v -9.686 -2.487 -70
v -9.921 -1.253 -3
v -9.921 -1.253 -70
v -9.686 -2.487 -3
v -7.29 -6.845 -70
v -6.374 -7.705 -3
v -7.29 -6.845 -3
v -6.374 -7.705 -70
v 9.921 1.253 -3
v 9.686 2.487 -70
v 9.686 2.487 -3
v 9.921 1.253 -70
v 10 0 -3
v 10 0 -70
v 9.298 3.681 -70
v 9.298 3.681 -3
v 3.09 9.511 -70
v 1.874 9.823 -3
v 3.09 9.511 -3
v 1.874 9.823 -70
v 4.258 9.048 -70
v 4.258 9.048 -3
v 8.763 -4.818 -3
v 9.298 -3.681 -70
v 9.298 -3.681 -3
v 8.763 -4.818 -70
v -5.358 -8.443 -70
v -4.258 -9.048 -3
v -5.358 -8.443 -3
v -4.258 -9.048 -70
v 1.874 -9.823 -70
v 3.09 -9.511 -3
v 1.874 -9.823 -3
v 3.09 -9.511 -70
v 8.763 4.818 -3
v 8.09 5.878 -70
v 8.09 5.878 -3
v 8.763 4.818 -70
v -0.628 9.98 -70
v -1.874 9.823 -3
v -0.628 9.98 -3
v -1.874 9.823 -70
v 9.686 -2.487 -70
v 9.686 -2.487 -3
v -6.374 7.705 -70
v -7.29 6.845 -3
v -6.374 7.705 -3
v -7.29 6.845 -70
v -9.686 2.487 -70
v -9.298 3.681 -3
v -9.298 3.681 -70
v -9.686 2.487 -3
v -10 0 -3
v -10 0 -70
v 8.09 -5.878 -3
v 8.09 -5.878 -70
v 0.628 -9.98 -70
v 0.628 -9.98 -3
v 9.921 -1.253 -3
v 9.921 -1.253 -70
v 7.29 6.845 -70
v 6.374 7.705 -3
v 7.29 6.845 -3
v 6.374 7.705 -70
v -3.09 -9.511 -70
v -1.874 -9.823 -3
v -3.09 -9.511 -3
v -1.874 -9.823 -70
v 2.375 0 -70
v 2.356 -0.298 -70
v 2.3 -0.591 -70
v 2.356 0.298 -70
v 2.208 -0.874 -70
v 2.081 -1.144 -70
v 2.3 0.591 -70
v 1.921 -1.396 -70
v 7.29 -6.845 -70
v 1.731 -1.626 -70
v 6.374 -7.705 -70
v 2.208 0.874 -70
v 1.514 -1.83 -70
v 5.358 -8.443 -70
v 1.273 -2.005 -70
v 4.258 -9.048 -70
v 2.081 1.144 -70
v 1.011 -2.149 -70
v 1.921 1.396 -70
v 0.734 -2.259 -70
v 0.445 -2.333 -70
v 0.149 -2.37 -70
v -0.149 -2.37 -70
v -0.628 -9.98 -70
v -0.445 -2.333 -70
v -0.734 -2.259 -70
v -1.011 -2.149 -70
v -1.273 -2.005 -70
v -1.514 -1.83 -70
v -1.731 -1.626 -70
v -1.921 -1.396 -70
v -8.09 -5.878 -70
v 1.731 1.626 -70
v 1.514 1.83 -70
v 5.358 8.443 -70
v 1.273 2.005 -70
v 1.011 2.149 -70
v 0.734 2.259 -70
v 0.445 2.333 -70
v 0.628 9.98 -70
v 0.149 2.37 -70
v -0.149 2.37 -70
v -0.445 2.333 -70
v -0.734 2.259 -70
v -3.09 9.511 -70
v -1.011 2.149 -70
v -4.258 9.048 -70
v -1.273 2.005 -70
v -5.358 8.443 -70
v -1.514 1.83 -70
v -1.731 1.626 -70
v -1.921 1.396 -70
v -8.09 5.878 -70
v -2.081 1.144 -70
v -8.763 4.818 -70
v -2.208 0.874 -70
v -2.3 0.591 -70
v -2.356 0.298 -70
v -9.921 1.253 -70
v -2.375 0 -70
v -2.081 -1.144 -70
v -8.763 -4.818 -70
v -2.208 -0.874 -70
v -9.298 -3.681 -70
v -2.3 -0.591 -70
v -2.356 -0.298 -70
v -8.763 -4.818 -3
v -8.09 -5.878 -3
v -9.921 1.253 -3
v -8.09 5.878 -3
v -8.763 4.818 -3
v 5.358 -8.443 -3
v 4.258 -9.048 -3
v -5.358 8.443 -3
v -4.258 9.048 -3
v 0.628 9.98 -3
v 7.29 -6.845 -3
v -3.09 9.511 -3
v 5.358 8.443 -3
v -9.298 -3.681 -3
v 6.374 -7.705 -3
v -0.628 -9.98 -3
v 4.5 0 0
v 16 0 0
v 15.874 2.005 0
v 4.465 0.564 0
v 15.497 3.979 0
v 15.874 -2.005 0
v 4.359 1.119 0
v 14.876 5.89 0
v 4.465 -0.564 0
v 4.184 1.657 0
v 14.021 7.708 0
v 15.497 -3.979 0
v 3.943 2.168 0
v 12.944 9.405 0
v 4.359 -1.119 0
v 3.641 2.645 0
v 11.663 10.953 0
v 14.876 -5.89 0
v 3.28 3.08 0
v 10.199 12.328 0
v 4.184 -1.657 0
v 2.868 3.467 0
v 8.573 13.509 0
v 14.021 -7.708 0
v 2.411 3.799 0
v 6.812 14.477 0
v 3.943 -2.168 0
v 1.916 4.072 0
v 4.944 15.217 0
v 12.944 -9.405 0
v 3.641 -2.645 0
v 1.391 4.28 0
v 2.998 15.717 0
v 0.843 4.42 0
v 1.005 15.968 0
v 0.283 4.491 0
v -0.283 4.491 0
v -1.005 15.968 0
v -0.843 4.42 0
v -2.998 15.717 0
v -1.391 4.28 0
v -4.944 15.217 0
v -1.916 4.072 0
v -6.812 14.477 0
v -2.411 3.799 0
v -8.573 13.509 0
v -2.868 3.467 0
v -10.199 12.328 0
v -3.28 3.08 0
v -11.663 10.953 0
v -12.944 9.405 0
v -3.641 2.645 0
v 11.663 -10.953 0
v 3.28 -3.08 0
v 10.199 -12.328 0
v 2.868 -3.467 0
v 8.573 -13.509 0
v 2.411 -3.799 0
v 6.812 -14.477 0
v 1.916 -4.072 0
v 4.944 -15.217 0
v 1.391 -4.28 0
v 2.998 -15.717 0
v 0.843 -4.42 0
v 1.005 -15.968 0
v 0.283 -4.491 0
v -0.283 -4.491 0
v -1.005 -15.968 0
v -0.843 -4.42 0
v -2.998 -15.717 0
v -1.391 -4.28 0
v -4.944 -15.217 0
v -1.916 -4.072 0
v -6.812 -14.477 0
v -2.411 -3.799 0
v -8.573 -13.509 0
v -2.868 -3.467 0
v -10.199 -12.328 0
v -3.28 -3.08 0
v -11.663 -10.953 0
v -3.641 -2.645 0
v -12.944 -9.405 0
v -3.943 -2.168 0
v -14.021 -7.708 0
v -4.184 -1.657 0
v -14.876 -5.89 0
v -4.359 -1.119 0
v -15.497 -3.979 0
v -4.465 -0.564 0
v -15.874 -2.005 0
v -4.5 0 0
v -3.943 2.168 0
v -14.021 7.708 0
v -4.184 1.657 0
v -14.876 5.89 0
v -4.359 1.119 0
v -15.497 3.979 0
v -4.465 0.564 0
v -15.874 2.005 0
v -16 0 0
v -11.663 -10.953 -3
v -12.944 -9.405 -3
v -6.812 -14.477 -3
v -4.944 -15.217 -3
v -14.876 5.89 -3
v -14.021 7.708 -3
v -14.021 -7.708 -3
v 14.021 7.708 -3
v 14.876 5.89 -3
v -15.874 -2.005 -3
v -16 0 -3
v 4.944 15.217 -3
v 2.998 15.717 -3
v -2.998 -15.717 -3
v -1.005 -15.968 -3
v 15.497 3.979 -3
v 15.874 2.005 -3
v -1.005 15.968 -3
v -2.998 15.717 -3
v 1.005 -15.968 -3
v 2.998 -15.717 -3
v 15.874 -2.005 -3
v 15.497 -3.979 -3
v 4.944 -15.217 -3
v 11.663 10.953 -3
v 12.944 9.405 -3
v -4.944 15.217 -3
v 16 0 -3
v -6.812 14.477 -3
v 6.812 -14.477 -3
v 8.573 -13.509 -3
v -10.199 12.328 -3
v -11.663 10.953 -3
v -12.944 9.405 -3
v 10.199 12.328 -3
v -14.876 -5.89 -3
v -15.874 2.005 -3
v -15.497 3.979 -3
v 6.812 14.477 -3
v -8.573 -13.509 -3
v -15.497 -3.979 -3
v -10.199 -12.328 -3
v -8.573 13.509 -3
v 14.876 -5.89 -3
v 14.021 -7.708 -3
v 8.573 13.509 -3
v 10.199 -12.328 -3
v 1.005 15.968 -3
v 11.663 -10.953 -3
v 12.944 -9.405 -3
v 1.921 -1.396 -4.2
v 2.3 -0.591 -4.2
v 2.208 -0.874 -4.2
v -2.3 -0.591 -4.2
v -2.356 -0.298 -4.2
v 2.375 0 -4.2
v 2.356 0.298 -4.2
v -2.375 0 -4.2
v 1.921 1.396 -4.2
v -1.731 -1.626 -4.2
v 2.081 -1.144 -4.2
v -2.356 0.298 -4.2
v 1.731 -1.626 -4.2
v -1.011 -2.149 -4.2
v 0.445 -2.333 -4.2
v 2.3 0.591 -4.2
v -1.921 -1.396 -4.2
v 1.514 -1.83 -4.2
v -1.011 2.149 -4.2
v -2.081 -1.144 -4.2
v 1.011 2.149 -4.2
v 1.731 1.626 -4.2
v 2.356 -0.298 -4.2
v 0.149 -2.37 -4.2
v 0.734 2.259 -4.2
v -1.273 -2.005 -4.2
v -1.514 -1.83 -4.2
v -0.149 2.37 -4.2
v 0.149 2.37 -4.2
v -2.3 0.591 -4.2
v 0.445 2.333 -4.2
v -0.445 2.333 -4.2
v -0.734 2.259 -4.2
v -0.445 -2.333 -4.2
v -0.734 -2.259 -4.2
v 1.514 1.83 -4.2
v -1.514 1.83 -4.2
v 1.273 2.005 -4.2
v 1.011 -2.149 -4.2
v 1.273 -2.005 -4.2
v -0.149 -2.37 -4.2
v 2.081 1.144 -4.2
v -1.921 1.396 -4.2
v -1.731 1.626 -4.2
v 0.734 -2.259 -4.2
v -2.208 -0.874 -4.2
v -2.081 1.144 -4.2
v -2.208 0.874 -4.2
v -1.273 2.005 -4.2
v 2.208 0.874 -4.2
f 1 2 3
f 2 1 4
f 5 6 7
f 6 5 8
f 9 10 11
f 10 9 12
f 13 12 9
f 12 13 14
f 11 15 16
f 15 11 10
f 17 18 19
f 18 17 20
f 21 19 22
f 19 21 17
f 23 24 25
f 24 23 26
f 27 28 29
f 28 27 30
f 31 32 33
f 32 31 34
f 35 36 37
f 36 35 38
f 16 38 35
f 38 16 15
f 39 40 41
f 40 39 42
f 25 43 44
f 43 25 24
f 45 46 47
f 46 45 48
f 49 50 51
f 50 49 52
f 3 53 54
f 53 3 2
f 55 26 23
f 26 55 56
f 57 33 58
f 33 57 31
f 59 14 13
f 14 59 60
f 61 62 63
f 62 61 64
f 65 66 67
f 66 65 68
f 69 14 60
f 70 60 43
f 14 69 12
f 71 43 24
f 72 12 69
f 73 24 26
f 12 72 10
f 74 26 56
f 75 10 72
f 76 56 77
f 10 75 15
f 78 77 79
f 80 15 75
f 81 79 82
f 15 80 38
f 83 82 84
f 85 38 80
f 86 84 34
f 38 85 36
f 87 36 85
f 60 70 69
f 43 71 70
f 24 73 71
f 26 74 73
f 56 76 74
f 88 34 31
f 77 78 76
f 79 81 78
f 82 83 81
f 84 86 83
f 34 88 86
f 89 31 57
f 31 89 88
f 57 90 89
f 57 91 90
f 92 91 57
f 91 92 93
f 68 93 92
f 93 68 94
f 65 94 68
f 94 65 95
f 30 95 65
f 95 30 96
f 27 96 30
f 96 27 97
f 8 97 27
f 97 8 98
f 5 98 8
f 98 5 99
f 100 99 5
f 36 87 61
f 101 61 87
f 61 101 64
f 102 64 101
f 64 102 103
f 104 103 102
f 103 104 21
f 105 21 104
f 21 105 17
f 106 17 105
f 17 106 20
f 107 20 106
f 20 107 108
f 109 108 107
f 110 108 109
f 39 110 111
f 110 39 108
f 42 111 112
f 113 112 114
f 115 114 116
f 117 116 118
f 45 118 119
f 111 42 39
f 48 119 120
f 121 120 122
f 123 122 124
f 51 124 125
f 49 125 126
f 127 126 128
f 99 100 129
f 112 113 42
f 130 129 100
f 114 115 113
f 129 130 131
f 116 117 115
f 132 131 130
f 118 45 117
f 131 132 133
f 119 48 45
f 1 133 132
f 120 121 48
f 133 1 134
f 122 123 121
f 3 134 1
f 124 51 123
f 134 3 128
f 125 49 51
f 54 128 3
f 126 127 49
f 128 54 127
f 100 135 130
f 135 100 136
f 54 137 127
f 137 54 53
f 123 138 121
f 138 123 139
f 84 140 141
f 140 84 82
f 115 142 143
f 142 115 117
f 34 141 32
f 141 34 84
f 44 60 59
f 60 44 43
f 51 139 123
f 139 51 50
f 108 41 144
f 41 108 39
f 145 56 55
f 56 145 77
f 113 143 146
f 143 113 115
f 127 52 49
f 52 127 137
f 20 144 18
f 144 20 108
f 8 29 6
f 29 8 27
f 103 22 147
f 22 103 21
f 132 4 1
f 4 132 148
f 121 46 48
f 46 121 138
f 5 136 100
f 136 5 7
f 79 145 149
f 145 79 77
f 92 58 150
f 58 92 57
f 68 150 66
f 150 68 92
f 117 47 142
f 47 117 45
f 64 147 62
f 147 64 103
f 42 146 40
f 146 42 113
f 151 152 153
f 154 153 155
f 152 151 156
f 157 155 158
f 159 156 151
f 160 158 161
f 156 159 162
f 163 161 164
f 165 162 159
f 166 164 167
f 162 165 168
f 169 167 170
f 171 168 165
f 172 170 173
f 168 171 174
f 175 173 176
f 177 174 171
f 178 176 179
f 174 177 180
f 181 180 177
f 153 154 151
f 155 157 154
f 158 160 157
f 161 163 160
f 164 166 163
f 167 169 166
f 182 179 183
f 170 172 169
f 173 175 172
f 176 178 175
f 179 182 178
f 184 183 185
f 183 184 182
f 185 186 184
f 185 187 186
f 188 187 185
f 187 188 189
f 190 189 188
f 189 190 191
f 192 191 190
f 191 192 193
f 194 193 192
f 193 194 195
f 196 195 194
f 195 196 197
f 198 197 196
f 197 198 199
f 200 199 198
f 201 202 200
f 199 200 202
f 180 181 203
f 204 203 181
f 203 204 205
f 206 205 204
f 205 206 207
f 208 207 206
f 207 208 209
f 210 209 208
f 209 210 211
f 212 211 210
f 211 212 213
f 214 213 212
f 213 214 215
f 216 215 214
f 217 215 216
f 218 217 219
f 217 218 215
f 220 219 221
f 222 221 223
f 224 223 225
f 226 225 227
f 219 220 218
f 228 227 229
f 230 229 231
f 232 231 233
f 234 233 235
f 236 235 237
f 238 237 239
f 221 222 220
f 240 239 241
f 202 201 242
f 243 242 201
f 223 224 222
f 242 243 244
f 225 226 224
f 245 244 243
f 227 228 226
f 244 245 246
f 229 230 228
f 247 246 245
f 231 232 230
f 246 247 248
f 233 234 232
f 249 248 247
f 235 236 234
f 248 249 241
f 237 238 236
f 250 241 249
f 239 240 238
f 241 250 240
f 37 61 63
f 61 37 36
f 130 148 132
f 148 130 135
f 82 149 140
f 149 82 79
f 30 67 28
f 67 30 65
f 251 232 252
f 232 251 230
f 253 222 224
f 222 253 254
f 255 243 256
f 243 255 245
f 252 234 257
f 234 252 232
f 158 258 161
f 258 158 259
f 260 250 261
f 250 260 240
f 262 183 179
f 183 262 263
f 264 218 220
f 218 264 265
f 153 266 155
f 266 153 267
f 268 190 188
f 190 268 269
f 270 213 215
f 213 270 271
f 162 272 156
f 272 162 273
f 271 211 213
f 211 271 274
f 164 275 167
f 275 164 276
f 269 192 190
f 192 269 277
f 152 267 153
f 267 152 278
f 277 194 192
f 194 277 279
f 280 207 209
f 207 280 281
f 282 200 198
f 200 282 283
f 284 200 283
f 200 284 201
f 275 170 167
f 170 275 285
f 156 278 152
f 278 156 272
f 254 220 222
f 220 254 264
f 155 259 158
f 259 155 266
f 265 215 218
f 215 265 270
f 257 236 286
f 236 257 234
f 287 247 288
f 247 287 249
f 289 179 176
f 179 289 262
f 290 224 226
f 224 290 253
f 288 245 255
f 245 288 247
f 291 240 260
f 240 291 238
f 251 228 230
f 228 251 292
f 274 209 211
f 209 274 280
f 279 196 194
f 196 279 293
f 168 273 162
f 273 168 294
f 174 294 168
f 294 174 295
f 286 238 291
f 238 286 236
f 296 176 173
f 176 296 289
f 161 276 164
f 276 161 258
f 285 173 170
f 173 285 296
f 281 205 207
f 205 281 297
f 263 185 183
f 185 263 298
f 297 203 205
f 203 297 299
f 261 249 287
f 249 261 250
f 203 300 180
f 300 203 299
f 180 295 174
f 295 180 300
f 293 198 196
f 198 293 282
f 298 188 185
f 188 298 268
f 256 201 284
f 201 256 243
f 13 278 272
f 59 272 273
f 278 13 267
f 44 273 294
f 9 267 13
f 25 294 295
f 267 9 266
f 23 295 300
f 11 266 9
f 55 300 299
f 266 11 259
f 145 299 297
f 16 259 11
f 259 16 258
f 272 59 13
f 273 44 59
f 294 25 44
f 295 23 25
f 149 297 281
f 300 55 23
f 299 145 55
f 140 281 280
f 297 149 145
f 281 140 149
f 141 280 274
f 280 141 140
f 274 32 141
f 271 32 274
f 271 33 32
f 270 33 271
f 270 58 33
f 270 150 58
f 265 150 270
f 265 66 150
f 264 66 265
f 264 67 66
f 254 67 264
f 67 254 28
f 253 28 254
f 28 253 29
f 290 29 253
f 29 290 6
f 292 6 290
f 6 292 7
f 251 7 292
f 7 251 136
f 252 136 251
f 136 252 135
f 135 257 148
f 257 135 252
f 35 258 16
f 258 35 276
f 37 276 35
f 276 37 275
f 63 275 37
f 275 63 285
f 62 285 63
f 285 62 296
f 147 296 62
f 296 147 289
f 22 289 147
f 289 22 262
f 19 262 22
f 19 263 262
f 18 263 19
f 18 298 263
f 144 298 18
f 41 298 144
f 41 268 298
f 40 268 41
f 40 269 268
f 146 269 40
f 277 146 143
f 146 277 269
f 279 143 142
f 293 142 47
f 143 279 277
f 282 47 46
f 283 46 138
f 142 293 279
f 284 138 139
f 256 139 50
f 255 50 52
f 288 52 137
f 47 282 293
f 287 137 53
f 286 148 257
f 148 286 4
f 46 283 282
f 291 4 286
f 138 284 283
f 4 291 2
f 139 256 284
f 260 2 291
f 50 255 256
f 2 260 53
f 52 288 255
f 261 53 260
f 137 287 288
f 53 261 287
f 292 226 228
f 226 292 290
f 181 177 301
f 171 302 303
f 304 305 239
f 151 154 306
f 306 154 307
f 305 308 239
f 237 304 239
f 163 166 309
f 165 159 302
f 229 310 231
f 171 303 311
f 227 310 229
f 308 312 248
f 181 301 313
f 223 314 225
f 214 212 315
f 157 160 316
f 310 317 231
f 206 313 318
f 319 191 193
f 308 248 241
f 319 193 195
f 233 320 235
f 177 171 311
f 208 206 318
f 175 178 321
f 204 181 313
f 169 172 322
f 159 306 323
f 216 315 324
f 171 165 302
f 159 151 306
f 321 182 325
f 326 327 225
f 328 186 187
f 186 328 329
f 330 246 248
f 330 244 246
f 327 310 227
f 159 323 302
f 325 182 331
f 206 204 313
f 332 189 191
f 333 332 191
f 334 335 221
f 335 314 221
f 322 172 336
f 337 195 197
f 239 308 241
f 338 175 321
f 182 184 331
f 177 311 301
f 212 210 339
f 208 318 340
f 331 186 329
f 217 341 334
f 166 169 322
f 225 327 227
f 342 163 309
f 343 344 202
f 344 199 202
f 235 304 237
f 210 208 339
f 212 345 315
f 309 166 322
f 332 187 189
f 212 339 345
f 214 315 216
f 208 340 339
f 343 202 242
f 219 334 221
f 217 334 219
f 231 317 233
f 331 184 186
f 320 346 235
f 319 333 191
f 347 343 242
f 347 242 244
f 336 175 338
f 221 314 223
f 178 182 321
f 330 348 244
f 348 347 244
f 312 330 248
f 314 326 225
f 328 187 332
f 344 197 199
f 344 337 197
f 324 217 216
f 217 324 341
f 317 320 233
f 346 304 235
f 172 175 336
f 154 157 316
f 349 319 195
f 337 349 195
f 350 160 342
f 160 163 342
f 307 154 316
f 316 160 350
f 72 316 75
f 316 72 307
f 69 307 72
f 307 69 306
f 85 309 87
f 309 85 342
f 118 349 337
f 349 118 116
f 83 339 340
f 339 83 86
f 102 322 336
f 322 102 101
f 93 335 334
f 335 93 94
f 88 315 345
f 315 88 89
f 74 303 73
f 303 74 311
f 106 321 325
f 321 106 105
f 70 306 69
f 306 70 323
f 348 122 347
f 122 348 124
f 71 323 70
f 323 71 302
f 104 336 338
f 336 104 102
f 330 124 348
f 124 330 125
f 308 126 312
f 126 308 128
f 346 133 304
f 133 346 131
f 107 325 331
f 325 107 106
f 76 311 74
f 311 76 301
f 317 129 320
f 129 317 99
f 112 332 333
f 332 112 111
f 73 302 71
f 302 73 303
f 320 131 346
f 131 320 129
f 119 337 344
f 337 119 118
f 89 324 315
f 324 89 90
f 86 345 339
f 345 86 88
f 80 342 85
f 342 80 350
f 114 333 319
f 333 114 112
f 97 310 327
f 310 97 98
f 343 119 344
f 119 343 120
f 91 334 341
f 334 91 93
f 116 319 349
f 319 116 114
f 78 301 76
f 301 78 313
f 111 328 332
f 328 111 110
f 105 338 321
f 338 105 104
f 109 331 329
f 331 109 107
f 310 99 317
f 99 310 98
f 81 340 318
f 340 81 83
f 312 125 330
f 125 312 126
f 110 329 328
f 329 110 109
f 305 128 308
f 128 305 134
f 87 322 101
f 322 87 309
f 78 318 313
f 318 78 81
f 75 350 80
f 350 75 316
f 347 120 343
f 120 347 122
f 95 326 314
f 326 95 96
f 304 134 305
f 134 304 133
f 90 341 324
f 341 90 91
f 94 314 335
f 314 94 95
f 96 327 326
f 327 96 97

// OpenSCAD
$fn = 50;


difference() {
	union() {
		translate(v = [0, 0, -70.0000000000]) {
			cylinder(h = 70, r = 10.0000000000);
		}
		translate(v = [0, 0, -3.0000000000]) {
			cylinder(h = 3, r = 16.0000000000);
		}
	}
	union() {
		translate(v = [0, 0, 0]) {
			rotate(a = [0, 0, 0]) {
				difference() {
					union() {
						#translate(v = [0, 0, -70.0000000000]) {
							cylinder(h = 70, r = 2.2500000000);
						}
						#translate(v = [0, 0, -4.2000000000]) {
							cylinder(h = 4.2000000000, r1 = 2.3750000000, r2 = 4.5000000000);
						}
						#translate(v = [0, 0, -70.0000000000]) {
							cylinder(h = 70, r = 2.3750000000);
						}
						#translate(v = [0, 0, -70.0000000000]) {
							cylinder(h = 70, r = 2.2500000000);
						}
					}
					union();
				}
			}
		}
	}
}
